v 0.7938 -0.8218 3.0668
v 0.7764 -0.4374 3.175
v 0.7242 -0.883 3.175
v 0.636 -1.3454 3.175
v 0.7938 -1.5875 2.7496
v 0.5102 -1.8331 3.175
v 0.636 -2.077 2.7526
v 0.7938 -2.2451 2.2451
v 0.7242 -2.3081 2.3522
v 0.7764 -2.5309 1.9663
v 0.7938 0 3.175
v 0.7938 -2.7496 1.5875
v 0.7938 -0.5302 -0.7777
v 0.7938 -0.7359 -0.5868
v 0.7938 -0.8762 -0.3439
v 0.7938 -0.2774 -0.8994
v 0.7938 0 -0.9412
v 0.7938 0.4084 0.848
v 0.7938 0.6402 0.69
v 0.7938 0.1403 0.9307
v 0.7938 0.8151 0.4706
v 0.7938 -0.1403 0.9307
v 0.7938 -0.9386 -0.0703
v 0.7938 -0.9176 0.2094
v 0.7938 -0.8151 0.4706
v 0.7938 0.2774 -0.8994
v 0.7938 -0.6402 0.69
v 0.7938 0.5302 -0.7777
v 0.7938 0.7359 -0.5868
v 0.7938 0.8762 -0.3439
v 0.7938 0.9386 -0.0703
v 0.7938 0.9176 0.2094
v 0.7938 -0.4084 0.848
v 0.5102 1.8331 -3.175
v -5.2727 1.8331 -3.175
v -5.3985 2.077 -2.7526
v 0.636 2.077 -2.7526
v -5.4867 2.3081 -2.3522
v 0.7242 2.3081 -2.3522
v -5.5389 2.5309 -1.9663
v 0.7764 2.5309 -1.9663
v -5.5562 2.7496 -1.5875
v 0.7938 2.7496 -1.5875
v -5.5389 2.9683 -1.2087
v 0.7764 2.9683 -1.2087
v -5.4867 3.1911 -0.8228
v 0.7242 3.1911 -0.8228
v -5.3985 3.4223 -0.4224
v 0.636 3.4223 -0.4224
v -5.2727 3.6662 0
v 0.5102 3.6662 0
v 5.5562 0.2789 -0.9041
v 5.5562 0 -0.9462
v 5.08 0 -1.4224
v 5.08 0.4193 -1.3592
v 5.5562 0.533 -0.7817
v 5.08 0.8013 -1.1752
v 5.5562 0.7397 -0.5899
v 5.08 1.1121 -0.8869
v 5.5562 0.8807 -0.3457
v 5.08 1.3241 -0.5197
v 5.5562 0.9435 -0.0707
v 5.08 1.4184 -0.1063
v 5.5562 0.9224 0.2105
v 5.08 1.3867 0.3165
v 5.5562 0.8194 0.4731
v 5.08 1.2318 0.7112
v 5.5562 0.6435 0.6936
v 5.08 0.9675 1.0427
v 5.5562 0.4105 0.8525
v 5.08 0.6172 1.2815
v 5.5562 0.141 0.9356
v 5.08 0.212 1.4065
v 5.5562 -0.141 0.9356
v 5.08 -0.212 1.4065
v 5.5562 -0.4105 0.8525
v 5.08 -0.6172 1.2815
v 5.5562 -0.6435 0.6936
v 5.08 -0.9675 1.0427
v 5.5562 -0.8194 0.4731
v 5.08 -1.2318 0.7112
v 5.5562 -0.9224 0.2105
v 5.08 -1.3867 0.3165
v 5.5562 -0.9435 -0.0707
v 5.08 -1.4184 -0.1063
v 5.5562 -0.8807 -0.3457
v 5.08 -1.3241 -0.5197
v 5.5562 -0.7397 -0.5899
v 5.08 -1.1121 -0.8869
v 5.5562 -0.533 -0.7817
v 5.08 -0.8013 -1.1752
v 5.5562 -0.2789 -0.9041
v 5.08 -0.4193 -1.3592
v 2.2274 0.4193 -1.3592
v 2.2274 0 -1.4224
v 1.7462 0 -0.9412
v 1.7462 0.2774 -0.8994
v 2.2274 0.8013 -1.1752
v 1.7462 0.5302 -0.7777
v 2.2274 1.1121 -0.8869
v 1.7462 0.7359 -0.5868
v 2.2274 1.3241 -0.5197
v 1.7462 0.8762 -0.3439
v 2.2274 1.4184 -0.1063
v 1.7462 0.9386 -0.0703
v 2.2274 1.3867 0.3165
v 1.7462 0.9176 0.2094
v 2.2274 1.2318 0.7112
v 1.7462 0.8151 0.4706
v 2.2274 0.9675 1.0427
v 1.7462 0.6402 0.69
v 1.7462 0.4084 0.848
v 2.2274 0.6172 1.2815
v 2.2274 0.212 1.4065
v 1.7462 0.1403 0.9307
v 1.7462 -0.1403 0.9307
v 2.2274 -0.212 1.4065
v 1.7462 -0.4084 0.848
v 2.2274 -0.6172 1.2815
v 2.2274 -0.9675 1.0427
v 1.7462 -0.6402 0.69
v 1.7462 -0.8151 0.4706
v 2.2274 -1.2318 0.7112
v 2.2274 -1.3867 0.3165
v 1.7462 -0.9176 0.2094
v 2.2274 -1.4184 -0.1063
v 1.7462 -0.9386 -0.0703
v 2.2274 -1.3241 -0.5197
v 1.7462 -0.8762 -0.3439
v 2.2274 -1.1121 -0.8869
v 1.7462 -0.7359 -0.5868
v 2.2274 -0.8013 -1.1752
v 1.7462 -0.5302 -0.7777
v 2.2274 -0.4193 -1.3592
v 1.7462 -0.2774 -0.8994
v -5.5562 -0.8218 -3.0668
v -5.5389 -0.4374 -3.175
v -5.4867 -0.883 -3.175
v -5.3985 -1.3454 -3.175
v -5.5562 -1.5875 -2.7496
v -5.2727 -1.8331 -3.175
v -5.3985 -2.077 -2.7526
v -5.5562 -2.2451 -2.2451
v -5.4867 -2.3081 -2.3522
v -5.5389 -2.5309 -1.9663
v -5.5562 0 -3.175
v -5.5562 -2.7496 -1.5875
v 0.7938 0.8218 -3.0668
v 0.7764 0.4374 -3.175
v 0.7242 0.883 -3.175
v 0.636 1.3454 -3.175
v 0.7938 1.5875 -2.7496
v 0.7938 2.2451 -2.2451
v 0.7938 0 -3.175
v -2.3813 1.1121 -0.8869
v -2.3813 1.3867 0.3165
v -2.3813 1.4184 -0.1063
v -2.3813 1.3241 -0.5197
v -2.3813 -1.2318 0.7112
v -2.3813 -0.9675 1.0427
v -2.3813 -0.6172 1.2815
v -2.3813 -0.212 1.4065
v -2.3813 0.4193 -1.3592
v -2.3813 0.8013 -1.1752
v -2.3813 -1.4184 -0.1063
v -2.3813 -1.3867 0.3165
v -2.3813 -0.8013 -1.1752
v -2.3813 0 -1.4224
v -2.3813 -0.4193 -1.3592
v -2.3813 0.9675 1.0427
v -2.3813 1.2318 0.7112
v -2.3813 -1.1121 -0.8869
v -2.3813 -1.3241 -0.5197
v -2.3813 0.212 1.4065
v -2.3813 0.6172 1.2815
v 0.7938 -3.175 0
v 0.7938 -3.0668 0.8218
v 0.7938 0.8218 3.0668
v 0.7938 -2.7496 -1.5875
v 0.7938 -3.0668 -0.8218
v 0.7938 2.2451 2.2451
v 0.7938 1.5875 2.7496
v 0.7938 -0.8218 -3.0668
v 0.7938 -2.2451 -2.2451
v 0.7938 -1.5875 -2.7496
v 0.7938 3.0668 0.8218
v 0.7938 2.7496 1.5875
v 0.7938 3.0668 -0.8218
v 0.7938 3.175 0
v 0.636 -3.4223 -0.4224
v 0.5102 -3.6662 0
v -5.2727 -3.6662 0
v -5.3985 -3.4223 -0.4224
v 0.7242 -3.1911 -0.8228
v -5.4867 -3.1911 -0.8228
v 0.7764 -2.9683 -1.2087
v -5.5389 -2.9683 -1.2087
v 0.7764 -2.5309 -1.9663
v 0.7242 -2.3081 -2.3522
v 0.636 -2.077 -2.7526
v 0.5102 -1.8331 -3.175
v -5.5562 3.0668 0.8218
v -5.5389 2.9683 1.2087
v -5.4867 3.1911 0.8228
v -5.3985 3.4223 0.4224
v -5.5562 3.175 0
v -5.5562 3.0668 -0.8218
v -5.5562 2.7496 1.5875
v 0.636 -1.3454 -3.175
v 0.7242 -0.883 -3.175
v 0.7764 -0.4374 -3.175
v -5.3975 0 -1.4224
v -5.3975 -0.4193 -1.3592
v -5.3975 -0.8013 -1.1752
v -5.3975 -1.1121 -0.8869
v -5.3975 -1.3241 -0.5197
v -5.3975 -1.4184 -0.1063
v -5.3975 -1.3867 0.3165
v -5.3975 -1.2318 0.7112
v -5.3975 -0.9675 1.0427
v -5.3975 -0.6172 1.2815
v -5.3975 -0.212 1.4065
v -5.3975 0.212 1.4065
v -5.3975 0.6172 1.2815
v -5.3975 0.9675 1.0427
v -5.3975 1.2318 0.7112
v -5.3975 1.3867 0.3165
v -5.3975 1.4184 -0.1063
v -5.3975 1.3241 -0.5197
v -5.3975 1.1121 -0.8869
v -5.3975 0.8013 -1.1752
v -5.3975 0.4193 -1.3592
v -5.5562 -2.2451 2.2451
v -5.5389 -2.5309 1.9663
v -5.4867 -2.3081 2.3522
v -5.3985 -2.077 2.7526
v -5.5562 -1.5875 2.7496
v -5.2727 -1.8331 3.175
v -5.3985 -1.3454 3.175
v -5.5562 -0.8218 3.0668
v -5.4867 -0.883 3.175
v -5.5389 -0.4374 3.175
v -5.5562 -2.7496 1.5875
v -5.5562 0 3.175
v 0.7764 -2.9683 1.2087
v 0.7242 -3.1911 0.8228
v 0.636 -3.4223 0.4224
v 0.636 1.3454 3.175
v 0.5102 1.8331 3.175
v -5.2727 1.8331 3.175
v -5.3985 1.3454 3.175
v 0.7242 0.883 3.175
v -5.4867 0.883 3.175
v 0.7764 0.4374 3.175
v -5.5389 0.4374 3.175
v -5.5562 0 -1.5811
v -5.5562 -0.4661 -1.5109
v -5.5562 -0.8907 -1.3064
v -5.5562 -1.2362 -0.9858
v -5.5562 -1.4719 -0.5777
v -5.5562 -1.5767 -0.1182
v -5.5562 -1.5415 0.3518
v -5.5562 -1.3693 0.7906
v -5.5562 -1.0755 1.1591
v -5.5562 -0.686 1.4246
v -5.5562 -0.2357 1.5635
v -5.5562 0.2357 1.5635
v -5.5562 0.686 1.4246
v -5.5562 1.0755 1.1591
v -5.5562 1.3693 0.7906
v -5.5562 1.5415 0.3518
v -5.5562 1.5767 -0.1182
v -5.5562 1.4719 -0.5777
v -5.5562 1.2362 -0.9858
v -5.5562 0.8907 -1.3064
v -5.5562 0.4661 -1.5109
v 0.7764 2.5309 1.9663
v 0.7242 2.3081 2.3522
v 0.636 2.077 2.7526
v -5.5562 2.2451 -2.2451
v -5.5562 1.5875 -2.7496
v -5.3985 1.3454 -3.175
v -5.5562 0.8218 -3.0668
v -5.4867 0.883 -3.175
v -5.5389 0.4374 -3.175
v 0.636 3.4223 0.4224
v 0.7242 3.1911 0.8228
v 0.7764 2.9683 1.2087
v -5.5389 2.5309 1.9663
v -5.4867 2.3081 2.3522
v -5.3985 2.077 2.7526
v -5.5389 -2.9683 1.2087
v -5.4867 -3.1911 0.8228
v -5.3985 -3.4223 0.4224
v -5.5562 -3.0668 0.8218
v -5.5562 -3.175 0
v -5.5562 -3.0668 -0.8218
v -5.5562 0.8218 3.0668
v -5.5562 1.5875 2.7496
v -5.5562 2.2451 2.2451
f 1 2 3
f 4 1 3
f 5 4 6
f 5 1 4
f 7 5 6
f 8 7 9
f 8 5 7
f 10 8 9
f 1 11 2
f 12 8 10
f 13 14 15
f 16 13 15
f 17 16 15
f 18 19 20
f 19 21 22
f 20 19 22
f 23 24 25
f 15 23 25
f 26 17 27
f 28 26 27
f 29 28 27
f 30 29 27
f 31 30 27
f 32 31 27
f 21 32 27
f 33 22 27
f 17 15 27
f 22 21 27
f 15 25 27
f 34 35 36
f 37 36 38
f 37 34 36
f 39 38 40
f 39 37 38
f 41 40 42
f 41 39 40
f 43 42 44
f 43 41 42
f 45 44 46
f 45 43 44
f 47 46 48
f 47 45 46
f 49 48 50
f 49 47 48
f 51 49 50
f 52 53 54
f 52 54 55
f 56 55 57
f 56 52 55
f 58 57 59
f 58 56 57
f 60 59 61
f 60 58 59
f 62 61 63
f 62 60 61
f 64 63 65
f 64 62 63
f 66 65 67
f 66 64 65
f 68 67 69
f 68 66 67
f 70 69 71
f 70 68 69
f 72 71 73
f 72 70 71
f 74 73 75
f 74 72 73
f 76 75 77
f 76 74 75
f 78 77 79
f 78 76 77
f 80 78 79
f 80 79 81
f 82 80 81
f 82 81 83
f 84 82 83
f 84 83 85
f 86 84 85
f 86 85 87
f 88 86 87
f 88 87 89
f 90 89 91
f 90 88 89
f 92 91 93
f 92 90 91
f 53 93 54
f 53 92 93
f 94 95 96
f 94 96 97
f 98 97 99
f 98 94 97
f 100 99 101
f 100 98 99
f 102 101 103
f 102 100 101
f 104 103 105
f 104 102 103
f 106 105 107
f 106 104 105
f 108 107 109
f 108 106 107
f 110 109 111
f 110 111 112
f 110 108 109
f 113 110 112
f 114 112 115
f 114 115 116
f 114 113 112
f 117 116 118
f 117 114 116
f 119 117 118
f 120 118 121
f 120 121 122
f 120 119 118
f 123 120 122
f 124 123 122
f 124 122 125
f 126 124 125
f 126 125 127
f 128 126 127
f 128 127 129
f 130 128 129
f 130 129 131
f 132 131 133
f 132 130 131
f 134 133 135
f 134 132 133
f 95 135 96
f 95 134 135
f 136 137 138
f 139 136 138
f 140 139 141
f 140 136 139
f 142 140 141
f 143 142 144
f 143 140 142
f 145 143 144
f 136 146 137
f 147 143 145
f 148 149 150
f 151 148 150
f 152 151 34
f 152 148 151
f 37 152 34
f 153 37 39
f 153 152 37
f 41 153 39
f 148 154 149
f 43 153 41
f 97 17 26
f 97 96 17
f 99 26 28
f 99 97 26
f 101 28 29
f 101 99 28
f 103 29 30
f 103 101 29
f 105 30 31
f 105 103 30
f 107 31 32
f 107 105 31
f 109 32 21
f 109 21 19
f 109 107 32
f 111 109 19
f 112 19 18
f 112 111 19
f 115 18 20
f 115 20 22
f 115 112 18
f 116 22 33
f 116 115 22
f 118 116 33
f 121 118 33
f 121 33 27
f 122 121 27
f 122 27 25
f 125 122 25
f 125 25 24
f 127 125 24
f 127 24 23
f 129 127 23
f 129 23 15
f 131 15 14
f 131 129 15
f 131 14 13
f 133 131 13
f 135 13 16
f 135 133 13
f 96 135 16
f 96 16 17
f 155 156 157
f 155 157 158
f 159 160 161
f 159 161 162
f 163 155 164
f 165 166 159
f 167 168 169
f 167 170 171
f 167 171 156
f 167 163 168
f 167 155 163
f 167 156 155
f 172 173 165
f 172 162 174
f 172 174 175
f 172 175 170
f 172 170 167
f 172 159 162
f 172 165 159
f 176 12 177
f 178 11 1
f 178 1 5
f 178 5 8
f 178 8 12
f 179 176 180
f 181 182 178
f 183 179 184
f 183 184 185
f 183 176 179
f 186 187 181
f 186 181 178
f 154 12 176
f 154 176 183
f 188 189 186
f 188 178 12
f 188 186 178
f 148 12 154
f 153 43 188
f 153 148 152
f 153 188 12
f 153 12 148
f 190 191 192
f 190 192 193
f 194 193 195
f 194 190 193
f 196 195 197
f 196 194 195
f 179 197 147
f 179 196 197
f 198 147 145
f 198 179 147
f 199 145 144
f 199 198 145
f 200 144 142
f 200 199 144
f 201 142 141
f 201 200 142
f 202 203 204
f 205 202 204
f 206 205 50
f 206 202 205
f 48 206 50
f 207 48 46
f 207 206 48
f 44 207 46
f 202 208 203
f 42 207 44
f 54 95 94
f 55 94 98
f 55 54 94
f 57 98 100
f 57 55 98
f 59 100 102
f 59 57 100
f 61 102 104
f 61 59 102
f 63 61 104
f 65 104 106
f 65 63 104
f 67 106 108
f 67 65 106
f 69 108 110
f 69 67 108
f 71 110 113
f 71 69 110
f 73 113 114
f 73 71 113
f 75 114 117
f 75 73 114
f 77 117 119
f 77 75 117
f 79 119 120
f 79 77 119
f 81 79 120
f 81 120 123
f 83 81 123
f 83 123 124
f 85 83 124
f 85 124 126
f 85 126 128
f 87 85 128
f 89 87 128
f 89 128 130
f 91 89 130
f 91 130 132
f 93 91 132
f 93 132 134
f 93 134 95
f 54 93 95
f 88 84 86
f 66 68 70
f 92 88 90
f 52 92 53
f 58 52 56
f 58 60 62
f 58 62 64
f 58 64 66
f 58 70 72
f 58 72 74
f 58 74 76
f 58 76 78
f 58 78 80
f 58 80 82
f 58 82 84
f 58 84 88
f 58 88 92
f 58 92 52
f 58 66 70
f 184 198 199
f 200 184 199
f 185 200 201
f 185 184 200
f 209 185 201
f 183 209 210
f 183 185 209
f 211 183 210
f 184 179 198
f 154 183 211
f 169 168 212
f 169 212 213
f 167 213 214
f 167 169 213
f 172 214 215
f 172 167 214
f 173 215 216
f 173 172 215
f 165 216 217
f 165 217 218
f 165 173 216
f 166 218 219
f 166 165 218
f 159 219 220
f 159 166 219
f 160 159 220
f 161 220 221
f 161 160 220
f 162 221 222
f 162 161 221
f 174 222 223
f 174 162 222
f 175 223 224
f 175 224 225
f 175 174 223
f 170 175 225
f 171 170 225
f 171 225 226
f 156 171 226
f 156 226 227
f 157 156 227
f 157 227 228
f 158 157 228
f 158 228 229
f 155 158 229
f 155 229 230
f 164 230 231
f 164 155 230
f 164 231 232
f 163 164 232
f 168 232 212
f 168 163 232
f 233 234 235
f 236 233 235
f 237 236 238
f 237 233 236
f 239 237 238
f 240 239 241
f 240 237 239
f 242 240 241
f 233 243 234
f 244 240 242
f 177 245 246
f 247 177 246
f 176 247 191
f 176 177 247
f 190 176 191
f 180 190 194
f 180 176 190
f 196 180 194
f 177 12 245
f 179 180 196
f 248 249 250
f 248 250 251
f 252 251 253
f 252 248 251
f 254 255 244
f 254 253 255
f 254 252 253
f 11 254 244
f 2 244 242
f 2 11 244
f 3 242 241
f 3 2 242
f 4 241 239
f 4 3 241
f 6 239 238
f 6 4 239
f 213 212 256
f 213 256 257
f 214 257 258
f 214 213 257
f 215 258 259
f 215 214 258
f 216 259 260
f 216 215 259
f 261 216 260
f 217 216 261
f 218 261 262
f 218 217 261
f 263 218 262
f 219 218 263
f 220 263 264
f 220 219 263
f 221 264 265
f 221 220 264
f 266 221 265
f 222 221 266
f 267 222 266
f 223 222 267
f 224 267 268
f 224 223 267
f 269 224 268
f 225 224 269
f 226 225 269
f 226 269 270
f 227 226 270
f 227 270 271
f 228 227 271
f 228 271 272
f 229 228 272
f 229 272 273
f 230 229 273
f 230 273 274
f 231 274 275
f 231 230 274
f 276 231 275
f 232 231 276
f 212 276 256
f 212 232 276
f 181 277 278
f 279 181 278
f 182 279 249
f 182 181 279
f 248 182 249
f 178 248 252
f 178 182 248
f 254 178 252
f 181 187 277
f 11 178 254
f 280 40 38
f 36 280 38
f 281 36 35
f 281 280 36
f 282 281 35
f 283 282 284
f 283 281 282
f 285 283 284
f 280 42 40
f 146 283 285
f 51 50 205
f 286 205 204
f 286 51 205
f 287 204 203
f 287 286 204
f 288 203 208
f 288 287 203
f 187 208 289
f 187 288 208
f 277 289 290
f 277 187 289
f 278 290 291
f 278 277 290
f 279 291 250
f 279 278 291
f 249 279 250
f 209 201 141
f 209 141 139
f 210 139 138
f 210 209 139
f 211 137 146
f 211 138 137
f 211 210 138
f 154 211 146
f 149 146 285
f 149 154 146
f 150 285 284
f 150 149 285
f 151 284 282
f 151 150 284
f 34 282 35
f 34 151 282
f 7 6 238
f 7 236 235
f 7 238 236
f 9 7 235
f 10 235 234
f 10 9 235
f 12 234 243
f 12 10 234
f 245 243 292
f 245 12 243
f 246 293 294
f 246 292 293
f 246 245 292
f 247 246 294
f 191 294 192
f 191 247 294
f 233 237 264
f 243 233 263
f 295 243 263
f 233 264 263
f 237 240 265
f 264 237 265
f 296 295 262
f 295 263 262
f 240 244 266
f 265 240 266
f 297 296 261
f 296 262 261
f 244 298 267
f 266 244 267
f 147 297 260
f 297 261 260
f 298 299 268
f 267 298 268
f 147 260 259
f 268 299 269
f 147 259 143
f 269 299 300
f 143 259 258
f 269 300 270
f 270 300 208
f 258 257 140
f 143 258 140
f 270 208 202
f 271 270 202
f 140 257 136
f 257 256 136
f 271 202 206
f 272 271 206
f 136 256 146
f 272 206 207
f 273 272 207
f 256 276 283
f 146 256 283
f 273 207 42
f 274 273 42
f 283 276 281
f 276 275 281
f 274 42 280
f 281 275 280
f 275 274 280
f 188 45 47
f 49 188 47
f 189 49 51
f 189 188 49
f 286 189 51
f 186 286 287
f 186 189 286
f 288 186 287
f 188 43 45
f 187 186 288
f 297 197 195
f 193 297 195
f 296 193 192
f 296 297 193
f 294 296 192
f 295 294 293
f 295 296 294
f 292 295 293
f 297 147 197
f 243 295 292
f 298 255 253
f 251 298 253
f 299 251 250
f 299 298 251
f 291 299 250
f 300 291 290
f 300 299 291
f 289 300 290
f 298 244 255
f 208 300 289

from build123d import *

# Parameters (mm, degrees)
SKETCH2_R         = 1.4224
EXTRUDE1_DEPTH    = 4.7625
CHAMFER1_SIZE     = 0.47625
EXTRUDE4_DEPTH    = 6.35
SKETCH8_OUTSIDE_W = 56.766
SKETCH8_OUTSIDE_H = 57.748
SKETCH8_OUTSIDE_R = 3.175
EXTRUDE5_DEPTH    = 13.124731526
EXTRUDE5_DRAFT    = -60
EXTRUDE7_START    = -3.175
SKETCH10_R        = 1.4224
EXTRUDE7_DEPTH    = 3.175
SKETCH9_OUTSIDE_W = 42.444
SKETCH9_OUTSIDE_H = 43.426
SKETCH9_OUTSIDE_R = 3.175
EXTRUDE6_DEPTH    = 8.990241444
EXTRUDE6_DRAFT    = -60
CHAMFER2_SIZE     = 0.15875


with BuildPart() as part:
    # Sketch2 → Extrude1 (new body)
    with BuildSketch(Plane(origin=(5.55625, 0, 0), x_dir=(0, 0, -1), z_dir=(1, 0, 0))):
        Circle(SKETCH2_R)
    extrude(amount=-EXTRUDE1_DEPTH)

    # Chamfer1
    chamfer1_edges = [part.edges().sort_by_distance(p)[0] for p in [
        (5.55625, 0, 1.4224),
    ]]
    chamfer(chamfer1_edges, length=CHAMFER1_SIZE)

    # Sketch16 → Cut-Revolve1 (revolve, cut)
    with BuildSketch(Plane.XY, mode=Mode.PRIVATE) as cut_revolve1_sk:
        Polygon((0.79375, 0.941214635), (1.74625, 0.941214635), (2.261805748, 1.456770383), (0.79375, 1.456770383), align=None)
    revolve(cut_revolve1_sk.sketch.rotate(Axis((0, 0, 0), (1, 0, 0)), 270), axis=Axis((0, 0, 0), (1, 0, 0)), mode=Mode.SUBTRACT)

    # Sketch7 → Extrude4 (add)
    with BuildSketch(Plane(origin=(0.79375, 0, 0), x_dir=(0, 0, -1), z_dir=(1, 0, 0))):
        Polygon((0, 3.666174209), (-3.175, 1.833087105), (-3.175, -1.833087105), (0, -3.666174209), (3.175, -1.833087105), (3.175, 1.833087105), align=None)
    extrude(amount=-EXTRUDE4_DEPTH)


with BuildPart() as extrude5_tool:
    # Sketch8 outside → Extrude5 (with draft: the straight prism first)
    with BuildSketch(Plane.ZY.offset(5.55625)):
        Rectangle(SKETCH8_OUTSIDE_W, SKETCH8_OUTSIDE_H)
        Circle(SKETCH8_OUTSIDE_R, mode=Mode.SUBTRACT)
    extrude(amount=-EXTRUDE5_DEPTH)
    # Extrude5: the draft: its side faces are tilted about the plane it starts from
    extrude5_sides = [extrude5_tool.faces().sort_by_distance(p)[0] for p in [
        (1.006115763, -28.874, 0),
        (1.006115763, 0, 28.383),
        (1.006115763, 28.874, 0),
        (1.006115763, 0, -28.383),
        (1.006115763, 0, -3.175),
    ]]
    draft(extrude5_sides, Plane.ZY.offset(5.55625), EXTRUDE5_DRAFT)


with BuildPart() as part_1:
    add(part.part)

    # Extrude5: cut by extrude5_tool
    add(extrude5_tool.part, mode=Mode.SUBTRACT)

    # Sketch10 → Extrude7 (cut)
    with BuildSketch(Plane.ZY.offset(5.55625).offset(EXTRUDE7_START)):
        with Locations(Location((0, 0, 0), (0, 0, 180))):
            Circle(SKETCH10_R)
    extrude(amount=EXTRUDE7_DEPTH, mode=Mode.SUBTRACT)


with BuildPart() as extrude6_tool:
    # Sketch9 outside → Extrude6 (with draft: the straight prism first)
    with BuildSketch(Plane(origin=(0.79375, 0, 0), x_dir=(0, 0, -1), z_dir=(1, 0, 0))):
        Rectangle(SKETCH9_OUTSIDE_W, SKETCH9_OUTSIDE_H)
        Circle(SKETCH9_OUTSIDE_R, mode=Mode.SUBTRACT)
    extrude(amount=-EXTRUDE6_DEPTH)
    # Extrude6: the draft: its side faces are tilted about the plane it starts from
    extrude6_sides = [extrude6_tool.faces().sort_by_distance(p)[0] for p in [
        (-3.701370722, -21.713, 0),
        (-3.701370722, 0, -21.222),
        (-3.701370722, 21.713, 0),
        (-3.701370722, 0, 21.222),
        (-3.701370722, 0, 3.175),
    ]]
    draft(extrude6_sides, Plane(origin=(0.79375, 0, 0), x_dir=(0, 0, -1), z_dir=(1, 0, 0)), EXTRUDE6_DRAFT)


with BuildPart() as part_2:
    add(part_1.part)

    # Extrude6: cut by extrude6_tool
    add(extrude6_tool.part, mode=Mode.SUBTRACT)


with BuildPart() as body_2:
    # Split1: the piece on the far side of the plane
    add(part_2.part)
    split(bisect_by=Plane(origin=(0.79375, 0, 0), x_dir=(0, 0, 1), z_dir=(1, 0, 0)), keep=Keep.BOTTOM)

    # Chamfer2
    chamfer2_edges = [body_2.edges().sort_by_distance(p)[0] for p in [
        (-5.55625, 0, 1.4224),
    ]]
    chamfer(chamfer2_edges, length=CHAMFER2_SIZE)


with BuildPart() as part_3:
    add(part_2.part)

    # Split1
    split(bisect_by=Plane(origin=(0.79375, 0, 0), x_dir=(0, 0, 1), z_dir=(1, 0, 0)), keep=Keep.TOP)


solid = Compound([body_2.part, part_3.part])
